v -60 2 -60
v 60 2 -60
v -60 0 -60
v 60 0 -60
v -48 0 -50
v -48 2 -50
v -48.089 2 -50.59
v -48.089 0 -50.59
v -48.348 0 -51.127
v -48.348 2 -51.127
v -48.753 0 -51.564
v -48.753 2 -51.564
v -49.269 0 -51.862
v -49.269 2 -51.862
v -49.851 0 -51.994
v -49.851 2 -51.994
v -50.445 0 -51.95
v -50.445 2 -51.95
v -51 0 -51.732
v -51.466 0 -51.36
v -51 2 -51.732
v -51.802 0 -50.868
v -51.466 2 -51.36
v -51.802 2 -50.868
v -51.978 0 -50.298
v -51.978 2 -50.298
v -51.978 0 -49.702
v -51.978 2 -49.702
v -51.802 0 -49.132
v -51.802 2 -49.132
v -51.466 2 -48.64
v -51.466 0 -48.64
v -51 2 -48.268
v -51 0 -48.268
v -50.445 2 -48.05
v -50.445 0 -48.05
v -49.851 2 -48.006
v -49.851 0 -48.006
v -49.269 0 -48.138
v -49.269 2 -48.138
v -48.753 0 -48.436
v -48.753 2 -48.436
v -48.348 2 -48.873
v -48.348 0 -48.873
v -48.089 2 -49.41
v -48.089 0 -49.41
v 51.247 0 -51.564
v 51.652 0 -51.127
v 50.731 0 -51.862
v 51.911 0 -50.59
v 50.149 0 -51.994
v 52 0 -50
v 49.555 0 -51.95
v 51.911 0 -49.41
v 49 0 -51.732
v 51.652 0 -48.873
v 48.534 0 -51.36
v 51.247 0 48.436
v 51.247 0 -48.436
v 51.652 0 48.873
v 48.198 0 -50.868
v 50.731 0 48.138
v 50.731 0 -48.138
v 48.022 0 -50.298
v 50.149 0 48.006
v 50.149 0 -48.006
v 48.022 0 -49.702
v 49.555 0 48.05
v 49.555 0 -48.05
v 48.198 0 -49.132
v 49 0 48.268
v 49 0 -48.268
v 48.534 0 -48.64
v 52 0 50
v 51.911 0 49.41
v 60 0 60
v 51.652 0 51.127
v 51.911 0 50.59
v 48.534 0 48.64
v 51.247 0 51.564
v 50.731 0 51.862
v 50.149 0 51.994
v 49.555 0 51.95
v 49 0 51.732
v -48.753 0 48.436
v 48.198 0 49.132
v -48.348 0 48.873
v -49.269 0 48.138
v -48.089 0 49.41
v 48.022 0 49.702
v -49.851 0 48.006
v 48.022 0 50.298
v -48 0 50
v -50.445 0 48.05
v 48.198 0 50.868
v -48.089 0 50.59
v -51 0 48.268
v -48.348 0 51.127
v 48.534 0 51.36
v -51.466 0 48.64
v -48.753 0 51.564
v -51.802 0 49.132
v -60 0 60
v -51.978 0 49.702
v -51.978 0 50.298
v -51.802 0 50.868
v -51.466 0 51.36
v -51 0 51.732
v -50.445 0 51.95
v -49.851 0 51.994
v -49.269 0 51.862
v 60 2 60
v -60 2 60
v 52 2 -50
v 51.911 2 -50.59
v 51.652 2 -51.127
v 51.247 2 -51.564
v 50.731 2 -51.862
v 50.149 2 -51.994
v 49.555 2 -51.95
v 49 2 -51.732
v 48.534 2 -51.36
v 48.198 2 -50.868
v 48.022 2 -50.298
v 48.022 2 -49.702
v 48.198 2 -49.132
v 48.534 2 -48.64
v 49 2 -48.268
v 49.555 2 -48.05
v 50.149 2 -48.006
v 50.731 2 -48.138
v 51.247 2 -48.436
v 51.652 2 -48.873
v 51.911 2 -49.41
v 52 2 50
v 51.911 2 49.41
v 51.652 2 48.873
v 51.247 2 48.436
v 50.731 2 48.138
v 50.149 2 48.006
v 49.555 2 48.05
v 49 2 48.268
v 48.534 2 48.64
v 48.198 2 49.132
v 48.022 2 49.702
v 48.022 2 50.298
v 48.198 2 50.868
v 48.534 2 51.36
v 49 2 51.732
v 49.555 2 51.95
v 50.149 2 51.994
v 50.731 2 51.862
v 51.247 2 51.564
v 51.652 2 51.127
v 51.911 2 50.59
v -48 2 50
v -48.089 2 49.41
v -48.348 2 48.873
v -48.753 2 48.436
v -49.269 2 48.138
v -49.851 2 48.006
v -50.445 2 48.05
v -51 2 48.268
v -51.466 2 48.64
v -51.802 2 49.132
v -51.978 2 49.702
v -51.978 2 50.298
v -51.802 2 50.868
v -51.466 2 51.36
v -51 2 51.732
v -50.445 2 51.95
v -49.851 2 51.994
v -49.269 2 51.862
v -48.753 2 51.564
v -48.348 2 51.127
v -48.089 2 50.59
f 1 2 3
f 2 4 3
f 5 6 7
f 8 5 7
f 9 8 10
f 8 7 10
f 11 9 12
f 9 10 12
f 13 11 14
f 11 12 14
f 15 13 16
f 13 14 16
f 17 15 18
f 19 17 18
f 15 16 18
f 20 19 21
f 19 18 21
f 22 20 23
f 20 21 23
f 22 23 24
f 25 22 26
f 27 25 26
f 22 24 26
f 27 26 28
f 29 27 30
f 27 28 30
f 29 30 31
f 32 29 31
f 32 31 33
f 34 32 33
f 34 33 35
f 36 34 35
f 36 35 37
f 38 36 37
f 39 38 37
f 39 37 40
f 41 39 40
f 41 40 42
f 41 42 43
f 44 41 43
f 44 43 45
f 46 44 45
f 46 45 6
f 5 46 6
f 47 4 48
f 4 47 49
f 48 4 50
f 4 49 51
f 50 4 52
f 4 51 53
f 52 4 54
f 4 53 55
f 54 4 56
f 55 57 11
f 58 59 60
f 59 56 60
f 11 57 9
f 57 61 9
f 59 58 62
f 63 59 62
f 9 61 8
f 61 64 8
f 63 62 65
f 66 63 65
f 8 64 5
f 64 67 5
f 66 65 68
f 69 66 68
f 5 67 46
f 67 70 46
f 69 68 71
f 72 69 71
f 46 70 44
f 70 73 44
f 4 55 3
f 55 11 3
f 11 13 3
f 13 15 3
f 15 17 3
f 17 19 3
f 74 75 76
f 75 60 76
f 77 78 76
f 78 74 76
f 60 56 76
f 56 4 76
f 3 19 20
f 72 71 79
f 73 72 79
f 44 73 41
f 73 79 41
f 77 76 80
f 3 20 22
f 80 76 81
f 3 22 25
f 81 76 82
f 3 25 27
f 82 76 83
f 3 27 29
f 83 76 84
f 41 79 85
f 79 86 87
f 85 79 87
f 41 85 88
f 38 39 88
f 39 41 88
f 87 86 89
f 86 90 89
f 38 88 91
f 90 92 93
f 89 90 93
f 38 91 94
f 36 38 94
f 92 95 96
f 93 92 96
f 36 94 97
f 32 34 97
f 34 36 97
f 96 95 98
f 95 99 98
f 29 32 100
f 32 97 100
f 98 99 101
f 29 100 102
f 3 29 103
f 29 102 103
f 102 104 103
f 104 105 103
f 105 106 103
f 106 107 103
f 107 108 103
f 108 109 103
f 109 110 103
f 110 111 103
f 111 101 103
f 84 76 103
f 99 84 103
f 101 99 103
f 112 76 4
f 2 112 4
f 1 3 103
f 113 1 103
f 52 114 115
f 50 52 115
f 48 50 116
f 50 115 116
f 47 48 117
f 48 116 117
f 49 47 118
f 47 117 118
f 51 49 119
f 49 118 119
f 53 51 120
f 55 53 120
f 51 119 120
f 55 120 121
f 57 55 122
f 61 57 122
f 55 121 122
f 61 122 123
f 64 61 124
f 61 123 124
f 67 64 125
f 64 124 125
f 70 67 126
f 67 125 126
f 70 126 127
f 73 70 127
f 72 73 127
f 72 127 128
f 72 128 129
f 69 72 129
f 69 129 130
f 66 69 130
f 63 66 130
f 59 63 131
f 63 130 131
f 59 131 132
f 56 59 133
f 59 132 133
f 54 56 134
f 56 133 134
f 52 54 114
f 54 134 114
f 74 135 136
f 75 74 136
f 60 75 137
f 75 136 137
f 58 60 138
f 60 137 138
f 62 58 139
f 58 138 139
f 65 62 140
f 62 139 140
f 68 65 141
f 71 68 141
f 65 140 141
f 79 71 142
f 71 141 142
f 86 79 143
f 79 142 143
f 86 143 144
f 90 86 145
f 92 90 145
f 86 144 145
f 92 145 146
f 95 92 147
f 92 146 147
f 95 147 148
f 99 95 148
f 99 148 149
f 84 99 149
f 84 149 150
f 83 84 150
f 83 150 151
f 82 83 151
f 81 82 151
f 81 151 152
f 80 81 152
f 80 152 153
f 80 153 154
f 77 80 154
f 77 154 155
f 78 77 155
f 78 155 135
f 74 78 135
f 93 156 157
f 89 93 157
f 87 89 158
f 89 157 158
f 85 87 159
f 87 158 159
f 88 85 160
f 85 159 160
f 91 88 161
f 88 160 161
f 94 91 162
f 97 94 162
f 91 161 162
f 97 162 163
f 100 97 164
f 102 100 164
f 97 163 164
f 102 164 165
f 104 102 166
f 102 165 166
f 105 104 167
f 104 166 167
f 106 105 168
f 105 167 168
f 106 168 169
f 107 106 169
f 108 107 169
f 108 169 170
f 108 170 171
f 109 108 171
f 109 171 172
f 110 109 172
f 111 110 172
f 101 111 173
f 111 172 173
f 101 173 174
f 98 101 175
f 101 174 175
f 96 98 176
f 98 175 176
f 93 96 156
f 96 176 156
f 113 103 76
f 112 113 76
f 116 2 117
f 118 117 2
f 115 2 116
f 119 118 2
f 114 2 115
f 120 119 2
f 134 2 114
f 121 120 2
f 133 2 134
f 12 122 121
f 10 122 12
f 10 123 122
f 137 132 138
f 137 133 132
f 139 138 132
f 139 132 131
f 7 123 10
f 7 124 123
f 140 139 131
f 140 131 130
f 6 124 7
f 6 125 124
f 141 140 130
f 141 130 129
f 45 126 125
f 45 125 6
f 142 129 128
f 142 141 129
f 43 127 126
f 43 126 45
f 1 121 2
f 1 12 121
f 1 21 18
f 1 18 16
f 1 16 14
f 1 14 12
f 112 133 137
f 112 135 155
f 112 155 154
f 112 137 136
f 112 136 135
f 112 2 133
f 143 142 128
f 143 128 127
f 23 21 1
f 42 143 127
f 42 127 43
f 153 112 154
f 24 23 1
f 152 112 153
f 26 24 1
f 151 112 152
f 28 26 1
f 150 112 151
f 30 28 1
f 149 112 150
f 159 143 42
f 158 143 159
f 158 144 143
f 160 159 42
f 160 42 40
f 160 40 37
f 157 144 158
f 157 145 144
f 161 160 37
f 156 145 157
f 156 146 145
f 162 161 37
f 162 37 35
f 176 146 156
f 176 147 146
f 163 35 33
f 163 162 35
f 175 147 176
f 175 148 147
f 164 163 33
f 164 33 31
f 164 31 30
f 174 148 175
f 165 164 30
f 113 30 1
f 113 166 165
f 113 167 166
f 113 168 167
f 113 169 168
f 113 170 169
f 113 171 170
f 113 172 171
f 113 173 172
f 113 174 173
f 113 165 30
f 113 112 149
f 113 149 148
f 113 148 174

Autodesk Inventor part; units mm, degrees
ref_plane "YZ Plane" through (0, 0, 0) normal (1, 0, 0) x (0, 1, 0)
ref_plane "XZ Plane" through (0, 0, 0) normal (0, 1, 0) x (-1, 0, 0)
sketch "Sketch1" plane through (0, 0, 0) normal (0, 1, 0) x (-1, 0, 0)
  line L0 (60, 60) -> (-60, 60)
  line L1 (-60, 60) -> (-60, -60)
  line L2 (-60, -60) -> (60, -60)
  line L3 (60, -60) -> (60, 60)
  line L4 (60, 60) -> (-60, -60) construction
  line L5 (-60, 60) -> (60, -60) construction
  point P0 (0, 0)
  dimension "d0" = 120
  dimension "d1" = 120
extrude "Extrusion1" add sketch "Sketch1" along normal blind 2
ref_plane "Work Plane1" through (0, 2, 0) normal (0, 1, 0) x (1, 0, 0)
sketch "Sketch2" plane through (0, 2, 0) normal (0, 1, 0) x (1, 0, 0)
  line L0 (60, 60) -> (-60, 60) projected
  line L1 (59.4693, -59.8704) -> (-60, 60)
  circle A0 centre (-50, 50) radius 2
  line L2 (0, 60) -> (0, 51.4464)
  circle A1 centre (50, 50) radius 2
  line L3 (60, -60) -> (60, 60) projected
  line L4 (60, 0) -> (52.6499, 0)
  circle A2 centre (50, -50) radius 2
  line L5 (-60, 60) -> (-60, -60) projected
  line L6 (-60, 0) -> (-53.051, 0)
  circle A3 centre (-50, -50) radius 2
  point P0 (0, 0)
  dimension "d5" = 4
extrude "Extrusion2" cut sketch "Sketch2" against normal through all
thread "Thread1" size "M9x1.25" class "6H" standard "ANSI Metric M Profile" full length
properties part number "PCB"
